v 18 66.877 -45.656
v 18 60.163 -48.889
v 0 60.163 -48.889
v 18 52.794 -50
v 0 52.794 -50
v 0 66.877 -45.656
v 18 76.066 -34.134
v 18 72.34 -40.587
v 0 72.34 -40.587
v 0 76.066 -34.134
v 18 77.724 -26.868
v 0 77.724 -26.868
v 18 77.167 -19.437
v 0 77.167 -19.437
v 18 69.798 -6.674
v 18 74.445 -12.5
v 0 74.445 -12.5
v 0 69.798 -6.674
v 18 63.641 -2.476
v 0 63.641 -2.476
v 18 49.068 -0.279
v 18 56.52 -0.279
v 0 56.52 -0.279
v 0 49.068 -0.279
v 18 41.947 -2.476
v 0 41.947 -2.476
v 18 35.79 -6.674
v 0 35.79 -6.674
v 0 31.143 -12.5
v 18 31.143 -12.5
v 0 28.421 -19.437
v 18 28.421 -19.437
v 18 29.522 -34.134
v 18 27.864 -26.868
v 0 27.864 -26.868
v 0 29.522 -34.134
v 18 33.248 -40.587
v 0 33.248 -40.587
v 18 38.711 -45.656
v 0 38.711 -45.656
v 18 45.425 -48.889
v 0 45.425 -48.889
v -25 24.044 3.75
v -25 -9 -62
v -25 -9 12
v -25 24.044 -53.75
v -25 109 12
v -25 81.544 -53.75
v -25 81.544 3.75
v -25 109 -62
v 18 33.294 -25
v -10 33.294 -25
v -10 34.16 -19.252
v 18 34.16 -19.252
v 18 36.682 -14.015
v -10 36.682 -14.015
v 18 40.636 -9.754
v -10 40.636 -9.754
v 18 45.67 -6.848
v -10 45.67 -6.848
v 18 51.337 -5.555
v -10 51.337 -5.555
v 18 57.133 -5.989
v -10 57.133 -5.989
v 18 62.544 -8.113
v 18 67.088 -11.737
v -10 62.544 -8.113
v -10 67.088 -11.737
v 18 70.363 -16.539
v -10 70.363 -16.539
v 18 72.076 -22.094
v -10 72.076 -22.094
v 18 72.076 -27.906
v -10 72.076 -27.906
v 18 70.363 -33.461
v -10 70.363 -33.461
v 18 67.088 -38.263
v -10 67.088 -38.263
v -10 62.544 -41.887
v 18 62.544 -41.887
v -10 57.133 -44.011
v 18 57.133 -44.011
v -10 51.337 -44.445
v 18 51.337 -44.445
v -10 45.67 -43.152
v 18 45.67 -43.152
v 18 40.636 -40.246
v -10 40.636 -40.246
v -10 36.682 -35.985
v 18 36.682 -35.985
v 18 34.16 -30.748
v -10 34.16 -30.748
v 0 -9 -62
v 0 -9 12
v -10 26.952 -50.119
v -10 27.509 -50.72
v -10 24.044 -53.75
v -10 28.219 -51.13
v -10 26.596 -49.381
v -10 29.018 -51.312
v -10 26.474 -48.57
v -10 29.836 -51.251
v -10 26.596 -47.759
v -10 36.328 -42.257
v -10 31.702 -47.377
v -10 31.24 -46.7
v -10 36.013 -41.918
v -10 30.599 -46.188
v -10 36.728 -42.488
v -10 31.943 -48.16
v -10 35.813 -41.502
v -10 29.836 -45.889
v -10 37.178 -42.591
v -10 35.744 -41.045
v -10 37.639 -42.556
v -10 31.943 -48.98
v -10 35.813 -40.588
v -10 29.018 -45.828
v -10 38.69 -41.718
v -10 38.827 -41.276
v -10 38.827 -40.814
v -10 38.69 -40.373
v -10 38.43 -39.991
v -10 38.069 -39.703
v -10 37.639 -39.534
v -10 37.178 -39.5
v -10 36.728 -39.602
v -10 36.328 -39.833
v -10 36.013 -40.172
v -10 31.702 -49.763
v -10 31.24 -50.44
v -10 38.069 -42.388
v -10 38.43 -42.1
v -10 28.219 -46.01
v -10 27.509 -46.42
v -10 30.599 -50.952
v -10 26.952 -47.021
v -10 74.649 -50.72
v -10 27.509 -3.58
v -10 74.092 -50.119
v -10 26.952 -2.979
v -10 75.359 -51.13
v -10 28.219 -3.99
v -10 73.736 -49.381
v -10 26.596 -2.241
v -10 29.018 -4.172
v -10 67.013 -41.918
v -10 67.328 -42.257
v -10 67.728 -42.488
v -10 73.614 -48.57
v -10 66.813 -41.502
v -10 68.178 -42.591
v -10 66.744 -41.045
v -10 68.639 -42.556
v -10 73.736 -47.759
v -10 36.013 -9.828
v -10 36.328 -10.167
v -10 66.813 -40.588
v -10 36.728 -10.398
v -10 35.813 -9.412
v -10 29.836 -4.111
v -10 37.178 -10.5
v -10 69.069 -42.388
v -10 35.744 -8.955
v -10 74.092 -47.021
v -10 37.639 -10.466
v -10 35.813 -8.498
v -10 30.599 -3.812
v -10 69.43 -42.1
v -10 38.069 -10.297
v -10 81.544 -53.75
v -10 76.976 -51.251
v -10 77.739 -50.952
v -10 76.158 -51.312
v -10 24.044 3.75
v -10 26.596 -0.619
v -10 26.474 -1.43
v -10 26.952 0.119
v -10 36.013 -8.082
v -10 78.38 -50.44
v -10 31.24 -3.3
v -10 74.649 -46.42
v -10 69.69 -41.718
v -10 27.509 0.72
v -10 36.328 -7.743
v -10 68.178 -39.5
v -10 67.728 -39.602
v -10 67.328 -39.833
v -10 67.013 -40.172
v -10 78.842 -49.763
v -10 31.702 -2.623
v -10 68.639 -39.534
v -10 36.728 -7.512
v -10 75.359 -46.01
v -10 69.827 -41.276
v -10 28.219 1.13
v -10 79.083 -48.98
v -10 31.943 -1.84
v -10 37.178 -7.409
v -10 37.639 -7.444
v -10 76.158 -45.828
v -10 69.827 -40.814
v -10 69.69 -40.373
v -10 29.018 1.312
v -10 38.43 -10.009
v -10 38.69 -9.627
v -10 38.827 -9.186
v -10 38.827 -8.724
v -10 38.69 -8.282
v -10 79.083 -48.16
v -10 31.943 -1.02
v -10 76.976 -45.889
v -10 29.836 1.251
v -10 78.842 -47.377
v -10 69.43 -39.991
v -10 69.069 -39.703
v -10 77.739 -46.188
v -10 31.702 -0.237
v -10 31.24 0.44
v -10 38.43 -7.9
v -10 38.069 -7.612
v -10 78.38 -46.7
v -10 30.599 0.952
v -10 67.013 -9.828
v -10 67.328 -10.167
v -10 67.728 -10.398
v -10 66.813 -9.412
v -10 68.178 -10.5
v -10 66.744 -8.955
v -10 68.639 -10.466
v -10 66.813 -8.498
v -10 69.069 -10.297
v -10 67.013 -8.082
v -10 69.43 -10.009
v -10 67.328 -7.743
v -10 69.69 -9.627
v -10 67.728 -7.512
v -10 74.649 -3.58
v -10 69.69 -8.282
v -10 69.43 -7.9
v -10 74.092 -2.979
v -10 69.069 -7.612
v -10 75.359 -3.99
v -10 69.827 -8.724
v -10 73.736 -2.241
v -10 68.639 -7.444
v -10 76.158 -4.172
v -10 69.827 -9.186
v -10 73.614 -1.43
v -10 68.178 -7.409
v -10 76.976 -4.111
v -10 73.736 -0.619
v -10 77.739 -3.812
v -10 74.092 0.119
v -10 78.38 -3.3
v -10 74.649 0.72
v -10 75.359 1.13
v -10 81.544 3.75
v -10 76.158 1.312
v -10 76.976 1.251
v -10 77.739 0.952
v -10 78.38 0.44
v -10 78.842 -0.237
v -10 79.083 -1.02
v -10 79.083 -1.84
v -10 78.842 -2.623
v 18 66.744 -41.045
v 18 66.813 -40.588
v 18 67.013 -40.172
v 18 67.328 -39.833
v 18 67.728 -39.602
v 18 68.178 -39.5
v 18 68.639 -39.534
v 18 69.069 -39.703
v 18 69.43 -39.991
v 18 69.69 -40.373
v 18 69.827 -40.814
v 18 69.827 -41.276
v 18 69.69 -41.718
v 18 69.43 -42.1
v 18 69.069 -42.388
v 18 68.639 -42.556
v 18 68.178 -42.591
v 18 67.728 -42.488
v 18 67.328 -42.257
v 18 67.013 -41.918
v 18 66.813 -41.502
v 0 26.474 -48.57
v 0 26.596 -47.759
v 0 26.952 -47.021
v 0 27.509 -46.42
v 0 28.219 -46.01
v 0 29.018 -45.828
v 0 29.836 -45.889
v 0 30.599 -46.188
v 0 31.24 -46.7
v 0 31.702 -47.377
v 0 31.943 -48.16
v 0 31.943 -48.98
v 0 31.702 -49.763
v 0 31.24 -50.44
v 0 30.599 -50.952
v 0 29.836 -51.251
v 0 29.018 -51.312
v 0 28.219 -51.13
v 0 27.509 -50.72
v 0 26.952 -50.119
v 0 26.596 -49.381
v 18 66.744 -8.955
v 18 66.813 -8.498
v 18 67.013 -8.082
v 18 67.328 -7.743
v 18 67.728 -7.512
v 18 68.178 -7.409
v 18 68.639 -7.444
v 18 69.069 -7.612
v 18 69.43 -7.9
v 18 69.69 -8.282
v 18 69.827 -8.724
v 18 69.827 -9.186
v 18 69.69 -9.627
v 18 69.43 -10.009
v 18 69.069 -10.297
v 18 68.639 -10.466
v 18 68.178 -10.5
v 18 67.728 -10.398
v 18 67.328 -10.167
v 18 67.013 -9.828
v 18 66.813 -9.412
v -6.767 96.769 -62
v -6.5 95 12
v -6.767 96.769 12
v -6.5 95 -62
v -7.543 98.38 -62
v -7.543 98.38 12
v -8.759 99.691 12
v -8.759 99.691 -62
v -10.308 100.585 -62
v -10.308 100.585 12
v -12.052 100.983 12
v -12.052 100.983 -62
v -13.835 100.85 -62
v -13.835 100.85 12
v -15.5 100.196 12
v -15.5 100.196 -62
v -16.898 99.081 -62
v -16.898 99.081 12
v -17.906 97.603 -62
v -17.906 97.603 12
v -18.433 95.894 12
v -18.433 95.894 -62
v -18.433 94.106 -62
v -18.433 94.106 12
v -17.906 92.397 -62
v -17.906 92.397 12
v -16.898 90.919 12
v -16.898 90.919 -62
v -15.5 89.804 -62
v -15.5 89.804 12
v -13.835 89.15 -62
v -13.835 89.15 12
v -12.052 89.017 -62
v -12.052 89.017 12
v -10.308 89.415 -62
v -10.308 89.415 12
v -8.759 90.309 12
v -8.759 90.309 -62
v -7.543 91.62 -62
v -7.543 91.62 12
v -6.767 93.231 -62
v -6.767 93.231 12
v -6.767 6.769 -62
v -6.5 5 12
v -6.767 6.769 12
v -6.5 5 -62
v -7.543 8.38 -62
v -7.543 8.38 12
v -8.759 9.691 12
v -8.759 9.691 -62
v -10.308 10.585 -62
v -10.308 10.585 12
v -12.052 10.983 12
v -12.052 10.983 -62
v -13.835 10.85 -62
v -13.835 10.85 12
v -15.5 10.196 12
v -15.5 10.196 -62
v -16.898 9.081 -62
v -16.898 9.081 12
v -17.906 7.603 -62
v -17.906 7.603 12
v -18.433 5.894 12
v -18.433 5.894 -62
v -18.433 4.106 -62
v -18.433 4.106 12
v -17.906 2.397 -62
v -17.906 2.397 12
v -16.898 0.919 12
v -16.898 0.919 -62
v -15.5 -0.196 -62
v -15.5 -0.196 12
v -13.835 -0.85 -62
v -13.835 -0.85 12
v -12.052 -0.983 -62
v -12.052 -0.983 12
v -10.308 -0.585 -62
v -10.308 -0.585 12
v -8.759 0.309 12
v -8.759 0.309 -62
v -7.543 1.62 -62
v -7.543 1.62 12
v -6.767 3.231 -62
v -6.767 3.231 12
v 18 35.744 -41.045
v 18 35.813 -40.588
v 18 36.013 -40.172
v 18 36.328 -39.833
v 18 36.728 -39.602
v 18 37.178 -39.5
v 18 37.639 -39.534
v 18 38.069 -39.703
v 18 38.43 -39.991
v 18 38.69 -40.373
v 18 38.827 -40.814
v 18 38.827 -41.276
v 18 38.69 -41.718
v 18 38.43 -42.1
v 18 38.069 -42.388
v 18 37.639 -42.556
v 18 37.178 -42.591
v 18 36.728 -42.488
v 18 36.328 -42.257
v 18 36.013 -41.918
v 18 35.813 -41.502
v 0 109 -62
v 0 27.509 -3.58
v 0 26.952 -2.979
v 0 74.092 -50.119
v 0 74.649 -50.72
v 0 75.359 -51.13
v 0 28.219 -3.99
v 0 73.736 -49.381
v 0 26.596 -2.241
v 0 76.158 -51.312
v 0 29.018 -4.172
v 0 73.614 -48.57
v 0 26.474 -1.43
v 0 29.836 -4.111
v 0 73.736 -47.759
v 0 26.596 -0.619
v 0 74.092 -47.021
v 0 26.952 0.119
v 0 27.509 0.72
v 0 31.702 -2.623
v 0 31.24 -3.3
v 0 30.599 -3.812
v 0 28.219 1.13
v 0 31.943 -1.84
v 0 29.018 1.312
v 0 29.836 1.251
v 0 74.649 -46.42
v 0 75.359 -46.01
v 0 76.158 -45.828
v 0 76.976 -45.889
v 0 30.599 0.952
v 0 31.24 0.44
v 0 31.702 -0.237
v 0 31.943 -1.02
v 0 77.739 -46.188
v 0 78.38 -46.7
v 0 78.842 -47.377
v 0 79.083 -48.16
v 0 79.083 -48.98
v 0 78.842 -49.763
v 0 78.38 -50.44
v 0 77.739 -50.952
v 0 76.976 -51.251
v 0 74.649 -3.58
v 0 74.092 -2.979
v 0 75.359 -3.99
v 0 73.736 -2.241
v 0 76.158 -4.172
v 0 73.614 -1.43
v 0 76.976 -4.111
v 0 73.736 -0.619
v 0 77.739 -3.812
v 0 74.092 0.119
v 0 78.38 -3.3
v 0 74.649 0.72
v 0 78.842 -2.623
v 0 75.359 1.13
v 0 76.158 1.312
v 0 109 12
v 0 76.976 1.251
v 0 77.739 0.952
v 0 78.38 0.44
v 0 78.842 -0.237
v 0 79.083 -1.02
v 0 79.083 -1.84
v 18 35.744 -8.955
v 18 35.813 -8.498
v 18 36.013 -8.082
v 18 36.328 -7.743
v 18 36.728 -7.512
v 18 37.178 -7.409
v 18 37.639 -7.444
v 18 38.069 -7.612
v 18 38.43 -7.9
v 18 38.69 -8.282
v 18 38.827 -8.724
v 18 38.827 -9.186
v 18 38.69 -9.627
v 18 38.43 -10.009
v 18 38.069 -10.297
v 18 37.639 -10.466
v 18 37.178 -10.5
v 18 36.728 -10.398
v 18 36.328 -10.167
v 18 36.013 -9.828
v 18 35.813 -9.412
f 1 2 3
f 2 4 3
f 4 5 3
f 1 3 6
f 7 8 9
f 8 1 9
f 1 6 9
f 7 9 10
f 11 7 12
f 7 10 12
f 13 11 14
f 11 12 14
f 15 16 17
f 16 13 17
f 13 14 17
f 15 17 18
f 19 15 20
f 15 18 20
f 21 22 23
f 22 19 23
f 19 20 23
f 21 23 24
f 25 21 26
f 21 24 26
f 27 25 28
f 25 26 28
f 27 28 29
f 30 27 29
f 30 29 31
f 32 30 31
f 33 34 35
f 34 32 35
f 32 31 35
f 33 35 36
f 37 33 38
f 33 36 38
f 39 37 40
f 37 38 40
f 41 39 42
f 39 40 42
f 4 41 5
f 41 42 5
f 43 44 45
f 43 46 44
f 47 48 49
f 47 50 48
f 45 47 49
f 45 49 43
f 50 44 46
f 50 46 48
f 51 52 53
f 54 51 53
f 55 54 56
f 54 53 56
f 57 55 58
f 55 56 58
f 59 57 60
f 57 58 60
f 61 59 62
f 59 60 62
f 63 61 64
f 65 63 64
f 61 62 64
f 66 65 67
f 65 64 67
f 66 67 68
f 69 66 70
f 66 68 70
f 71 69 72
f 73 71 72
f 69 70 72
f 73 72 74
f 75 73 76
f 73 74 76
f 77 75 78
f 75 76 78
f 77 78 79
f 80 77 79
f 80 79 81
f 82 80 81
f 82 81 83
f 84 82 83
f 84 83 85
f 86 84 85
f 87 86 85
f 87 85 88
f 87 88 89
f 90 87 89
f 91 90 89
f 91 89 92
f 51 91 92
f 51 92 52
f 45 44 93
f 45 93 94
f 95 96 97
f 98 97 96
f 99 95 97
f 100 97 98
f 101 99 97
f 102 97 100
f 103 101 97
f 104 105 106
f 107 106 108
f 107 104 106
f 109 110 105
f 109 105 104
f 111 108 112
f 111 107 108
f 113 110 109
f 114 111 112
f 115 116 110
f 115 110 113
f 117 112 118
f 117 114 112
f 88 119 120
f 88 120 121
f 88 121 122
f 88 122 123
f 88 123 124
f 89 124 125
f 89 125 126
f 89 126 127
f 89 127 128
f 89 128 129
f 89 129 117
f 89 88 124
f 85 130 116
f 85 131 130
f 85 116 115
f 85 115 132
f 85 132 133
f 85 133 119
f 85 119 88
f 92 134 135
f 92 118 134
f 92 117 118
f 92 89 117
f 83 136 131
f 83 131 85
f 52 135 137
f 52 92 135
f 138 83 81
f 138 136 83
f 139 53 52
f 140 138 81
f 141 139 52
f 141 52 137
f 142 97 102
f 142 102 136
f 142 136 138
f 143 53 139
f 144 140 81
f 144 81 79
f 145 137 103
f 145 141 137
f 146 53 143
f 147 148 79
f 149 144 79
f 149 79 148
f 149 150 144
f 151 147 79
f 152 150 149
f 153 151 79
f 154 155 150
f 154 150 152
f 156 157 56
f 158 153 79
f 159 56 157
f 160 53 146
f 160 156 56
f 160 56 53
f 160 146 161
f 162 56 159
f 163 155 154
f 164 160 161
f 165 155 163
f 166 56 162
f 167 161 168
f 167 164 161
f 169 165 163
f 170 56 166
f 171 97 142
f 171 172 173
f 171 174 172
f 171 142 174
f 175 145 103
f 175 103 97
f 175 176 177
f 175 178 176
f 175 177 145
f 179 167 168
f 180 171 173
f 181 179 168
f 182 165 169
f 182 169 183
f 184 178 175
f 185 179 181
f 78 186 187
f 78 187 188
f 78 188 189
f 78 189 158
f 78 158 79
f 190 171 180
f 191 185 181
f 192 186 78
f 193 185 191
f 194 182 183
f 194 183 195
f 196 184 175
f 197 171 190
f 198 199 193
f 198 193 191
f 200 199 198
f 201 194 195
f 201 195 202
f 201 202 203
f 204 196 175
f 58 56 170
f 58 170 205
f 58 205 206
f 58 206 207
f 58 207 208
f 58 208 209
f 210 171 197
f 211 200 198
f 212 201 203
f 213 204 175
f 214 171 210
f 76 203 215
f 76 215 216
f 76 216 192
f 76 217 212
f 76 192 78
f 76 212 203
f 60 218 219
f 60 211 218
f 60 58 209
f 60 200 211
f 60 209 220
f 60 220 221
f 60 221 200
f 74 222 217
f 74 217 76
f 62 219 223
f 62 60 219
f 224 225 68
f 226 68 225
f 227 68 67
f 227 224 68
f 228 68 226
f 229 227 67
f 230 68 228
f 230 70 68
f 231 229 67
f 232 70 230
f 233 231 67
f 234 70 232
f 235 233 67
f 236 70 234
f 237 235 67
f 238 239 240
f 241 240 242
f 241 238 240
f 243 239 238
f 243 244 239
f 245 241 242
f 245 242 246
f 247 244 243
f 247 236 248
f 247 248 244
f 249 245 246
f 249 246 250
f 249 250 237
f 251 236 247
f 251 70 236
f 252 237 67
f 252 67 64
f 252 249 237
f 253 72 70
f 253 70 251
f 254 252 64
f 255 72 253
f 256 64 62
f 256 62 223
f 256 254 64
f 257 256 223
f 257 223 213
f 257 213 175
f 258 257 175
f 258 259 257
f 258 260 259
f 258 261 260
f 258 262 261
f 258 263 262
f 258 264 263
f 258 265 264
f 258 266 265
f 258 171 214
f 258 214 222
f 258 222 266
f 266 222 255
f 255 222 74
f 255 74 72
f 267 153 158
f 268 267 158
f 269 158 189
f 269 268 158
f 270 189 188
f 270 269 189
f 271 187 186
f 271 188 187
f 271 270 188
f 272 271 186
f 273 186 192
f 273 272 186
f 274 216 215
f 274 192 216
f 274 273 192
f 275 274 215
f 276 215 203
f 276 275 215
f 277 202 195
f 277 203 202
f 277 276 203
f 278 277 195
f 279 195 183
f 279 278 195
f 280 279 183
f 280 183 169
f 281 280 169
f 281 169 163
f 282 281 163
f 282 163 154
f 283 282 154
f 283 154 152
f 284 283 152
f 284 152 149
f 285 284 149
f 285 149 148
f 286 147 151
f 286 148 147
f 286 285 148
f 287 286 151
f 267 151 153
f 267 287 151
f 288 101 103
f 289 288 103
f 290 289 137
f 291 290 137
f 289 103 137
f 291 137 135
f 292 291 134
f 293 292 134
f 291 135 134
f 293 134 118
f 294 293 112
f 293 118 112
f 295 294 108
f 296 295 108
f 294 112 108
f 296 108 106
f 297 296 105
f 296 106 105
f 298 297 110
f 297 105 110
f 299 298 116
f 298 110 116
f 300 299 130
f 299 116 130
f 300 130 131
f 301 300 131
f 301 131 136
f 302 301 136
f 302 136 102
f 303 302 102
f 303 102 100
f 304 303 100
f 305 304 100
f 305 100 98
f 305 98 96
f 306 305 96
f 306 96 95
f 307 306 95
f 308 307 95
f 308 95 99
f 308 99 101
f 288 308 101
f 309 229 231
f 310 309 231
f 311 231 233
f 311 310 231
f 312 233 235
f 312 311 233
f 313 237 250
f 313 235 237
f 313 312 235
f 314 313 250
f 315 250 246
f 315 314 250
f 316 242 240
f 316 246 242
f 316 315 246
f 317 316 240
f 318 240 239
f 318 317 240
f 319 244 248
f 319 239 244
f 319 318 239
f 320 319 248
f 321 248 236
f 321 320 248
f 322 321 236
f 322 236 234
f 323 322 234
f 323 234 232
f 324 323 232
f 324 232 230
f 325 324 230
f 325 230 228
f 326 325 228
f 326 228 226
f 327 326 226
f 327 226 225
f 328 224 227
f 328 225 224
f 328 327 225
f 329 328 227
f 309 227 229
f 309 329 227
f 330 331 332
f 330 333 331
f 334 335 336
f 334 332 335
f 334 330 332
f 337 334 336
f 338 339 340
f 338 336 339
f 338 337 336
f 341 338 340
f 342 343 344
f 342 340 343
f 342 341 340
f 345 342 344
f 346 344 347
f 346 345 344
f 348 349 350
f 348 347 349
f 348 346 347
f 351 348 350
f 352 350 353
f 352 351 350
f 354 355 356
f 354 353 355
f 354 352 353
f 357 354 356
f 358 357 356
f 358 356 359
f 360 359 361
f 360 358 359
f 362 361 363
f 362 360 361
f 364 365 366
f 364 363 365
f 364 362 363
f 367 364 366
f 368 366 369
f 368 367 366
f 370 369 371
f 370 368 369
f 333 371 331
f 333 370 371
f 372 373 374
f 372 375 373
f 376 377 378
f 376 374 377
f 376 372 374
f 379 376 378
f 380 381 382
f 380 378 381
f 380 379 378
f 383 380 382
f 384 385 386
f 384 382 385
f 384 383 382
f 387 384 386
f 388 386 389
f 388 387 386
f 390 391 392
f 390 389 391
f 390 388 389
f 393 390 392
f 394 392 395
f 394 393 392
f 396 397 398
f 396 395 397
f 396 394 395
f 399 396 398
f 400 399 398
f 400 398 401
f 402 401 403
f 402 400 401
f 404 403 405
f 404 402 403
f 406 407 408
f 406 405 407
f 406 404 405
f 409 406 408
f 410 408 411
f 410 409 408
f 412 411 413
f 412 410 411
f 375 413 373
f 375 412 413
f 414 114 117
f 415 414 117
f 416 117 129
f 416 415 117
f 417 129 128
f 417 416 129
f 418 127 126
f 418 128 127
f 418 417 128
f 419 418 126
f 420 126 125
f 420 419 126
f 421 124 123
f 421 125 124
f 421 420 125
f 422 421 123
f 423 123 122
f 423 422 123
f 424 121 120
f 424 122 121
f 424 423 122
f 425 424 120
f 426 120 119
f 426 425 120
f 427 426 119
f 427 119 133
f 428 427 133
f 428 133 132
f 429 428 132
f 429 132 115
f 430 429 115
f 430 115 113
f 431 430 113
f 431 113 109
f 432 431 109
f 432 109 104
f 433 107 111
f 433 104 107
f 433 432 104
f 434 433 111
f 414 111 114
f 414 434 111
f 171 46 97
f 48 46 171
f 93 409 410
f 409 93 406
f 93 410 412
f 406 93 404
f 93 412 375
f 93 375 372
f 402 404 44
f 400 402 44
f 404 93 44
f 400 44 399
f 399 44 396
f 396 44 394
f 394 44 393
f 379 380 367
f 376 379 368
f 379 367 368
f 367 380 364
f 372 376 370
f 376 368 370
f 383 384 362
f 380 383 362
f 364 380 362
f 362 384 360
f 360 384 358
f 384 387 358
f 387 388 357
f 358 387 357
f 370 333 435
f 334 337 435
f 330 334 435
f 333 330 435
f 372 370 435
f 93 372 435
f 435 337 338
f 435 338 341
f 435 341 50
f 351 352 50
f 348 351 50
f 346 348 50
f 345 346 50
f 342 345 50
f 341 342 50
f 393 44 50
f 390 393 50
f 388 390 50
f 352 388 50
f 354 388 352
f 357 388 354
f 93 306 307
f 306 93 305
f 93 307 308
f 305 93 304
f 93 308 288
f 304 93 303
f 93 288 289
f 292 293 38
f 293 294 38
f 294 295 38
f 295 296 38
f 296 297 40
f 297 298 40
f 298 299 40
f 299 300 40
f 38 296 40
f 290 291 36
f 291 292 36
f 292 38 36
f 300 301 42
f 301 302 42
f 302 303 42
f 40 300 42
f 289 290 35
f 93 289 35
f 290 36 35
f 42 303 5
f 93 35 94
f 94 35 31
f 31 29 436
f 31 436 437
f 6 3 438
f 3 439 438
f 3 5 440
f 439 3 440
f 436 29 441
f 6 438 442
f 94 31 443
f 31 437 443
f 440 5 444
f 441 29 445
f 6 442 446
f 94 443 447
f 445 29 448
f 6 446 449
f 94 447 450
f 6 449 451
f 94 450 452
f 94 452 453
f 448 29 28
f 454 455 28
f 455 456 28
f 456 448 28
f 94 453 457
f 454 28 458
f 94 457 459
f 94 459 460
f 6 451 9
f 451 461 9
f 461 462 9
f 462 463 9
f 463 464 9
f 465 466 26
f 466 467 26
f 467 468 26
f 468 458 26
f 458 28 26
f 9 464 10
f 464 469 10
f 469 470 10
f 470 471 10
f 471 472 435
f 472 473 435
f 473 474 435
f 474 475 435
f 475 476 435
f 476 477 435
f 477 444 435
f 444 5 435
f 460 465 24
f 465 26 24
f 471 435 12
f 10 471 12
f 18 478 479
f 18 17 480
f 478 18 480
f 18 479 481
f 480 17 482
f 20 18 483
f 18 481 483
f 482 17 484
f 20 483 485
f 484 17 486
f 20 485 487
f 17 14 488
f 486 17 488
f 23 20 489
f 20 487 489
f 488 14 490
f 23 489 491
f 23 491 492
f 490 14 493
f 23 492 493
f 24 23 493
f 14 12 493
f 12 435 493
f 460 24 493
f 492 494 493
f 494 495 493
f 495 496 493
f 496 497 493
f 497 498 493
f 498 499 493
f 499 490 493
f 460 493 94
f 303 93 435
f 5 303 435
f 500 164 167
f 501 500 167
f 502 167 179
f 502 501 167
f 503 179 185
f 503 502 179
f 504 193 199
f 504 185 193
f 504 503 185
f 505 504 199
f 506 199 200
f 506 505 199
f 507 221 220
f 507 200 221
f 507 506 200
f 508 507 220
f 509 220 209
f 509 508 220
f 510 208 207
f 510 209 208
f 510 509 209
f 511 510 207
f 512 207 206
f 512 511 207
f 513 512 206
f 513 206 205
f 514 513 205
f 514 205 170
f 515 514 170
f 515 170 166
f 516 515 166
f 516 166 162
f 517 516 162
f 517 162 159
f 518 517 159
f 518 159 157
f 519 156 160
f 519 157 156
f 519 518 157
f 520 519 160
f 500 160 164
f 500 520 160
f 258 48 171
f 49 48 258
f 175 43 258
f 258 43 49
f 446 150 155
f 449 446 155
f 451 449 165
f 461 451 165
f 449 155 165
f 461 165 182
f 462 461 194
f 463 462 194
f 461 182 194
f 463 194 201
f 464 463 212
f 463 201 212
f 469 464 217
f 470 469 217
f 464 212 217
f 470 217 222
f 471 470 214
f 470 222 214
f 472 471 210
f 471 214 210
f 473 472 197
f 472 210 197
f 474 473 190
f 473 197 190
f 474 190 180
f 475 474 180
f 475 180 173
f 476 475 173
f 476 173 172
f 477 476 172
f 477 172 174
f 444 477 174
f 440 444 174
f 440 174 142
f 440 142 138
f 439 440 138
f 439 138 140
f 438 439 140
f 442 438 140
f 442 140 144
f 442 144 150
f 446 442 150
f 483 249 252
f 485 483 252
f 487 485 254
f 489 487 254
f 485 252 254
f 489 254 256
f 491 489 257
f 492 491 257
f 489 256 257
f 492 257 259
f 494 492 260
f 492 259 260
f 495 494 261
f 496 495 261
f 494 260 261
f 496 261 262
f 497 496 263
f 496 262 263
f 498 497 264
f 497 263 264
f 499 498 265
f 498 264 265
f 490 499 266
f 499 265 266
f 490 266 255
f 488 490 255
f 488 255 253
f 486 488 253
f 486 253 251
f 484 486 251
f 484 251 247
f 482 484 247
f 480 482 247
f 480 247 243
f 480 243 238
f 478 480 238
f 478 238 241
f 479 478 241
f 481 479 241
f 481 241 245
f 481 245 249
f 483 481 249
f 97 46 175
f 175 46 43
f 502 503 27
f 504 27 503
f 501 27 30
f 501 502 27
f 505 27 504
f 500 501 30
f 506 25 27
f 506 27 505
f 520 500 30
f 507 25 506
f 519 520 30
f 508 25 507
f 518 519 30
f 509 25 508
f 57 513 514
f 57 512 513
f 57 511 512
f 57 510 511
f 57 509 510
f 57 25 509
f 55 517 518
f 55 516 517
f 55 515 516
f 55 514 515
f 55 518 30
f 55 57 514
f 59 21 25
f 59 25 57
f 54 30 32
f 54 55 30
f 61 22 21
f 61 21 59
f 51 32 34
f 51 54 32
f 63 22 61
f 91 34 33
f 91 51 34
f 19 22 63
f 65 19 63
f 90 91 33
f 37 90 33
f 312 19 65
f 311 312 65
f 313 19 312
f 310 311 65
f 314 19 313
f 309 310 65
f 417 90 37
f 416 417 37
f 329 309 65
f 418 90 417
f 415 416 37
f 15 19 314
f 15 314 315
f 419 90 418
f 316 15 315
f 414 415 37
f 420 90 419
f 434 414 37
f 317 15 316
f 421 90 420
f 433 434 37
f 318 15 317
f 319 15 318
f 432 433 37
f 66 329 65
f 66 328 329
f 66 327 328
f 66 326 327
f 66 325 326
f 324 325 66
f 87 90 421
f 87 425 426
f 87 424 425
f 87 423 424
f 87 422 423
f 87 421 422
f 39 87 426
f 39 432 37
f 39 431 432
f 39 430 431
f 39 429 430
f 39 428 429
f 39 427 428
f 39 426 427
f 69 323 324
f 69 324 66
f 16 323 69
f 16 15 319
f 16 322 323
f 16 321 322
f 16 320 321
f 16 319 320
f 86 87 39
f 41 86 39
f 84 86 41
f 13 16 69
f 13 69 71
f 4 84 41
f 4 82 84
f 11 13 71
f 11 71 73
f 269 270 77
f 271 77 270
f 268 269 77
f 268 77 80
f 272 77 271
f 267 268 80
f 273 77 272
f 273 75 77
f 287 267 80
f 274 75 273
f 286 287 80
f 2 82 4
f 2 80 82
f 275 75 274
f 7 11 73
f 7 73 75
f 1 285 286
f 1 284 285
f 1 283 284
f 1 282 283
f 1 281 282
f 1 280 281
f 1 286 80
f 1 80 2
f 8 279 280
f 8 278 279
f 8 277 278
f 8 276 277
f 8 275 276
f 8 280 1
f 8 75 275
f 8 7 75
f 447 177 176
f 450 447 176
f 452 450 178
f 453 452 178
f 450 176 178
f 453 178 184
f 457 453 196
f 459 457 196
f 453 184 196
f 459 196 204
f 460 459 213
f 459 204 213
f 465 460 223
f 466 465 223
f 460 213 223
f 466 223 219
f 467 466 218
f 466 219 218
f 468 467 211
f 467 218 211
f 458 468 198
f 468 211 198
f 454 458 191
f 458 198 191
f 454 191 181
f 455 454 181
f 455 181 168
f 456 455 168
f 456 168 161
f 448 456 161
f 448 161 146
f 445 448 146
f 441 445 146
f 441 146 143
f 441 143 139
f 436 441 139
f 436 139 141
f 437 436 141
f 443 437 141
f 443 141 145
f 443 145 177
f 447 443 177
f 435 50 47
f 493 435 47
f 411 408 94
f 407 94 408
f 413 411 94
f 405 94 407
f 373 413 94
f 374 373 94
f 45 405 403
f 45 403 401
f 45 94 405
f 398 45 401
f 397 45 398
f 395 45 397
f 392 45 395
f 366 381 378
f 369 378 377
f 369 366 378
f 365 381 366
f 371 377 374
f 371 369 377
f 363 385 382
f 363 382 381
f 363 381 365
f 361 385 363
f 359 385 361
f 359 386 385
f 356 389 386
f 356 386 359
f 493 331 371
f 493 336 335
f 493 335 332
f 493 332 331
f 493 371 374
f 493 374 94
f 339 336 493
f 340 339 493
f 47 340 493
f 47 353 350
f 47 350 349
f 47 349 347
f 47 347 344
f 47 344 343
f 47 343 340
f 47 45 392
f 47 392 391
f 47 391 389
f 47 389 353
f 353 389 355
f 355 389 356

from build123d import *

# Parameters (mm, degrees)
BOSS_EXTRUDE1_DEPTH      = 320
SKETCH2_W                = 25
SKETCH2_H                = 100
BOSS_EXTRUDE2_DEPTH      = 50
CUT_EXTRUDE1_DEPTH       = 337.19190948
CUT_EXTRUDE1_DEPTH_BACK  = 337.19190948
SKETCH3_R                = 5
SKETCH4_W                = 150
SKETCH4_H                = 19.211352241
BOSS_EXTRUDE3_DEPTH      = 100
BOSS_EXTRUDE4_DEPTH      = 100
SKETCH6_W                = 42.1
SKETCH6_H                = 42.1
CUT_EXTRUDE2_DEPTH       = 10
SKETCH7_R                = 11
CUT_EXTRUDE3_DEPTH       = 2
CUT_EXTRUDE4_DEPTH       = 391.24267
CUT_EXTRUDE4_DEPTH_BACK  = 391.24267
SKETCH8_R                = 11
SKETCH10_R               = 25
SKETCH10_R_2             = 11
BOSS_EXTRUDE5_DEPTH      = 18
CUT_EXTRUDE6_DEPTH       = 381.347658714
CUT_EXTRUDE6_DEPTH_BACK  = 381.347658714
BOSS_EXTRUDE6_REACH      = 243.332
SKETCH12_W               = 150
SKETCH12_H               = 15
SKETCH13_W               = 165
SKETCH13_H               = 5
BOSS_EXTRUDE7_DEPTH      = 100
CUT_EXTRUDE7_DEPTH       = 282.821411126
CUT_EXTRUDE7_DEPTH_BACK  = 282.821411126
SKETCH16_W               = 62.5
SKETCH16_H               = 22.206056974
CUT_EXTRUDE9_DEPTH       = 298.574684732
SKETCH17_W               = 62.5
SKETCH17_H               = 5
BOSS_EXTRUDE8_DEPTH      = 15
SKETCH18_W               = 62.5
SKETCH18_H               = 11.362446971
BOSS_EXTRUDE9_DEPTH      = 15
SKETCH19_W               = 25
SKETCH19_H               = 100
BOSS_EXTRUDE11_DEPTH     = 9
SKETCH20_R               = 5
CUT_EXTRUDE10_DEPTH      = 62.5
SKETCH21_R               = 6
CUT_EXTRUDE11_DEPTH      = 62.5
CUT_EXTRUDE12_DEPTH      = 7
CUT_EXTRUDE14_DEPTH      = 261.438787644
CUT_EXTRUDE14_DEPTH_BACK = 261.438787644
SKETCH23_OUTSIDE_W       = 346.597
SKETCH23_OUTSIDE_H       = 164.386
SKETCH23_OUTSIDE_W_2     = 50
SKETCH23_OUTSIDE_H_2     = 100
CUT_EXTRUDE15_DEPTH      = 115.564392374
CUT_EXTRUDE15_DEPTH_BACK = 115.564392374
SKETCH24_R               = 6
SKETCH25_W               = 25
SKETCH25_H               = 5
BOSS_EXTRUDE12_DEPTH     = 50
SKETCH26_W               = 25
SKETCH26_H               = 4
BOSS_EXTRUDE13_DEPTH     = 50
CUT_EXTRUDE17_DEPTH      = 125.378454726
CUT_EXTRUDE17_DEPTH_BACK = 125.378454726
SKETCH27_R               = 1.55
SKETCH28_R               = 6
BOSS_EXTRUDE14_DEPTH     = 50
SKETCH29_R               = 5
CUT_EXTRUDE18_DEPTH      = 123.498979588
SKETCH30_R               = 5
BOSS_EXTRUDE15_DEPTH     = 50
SKETCH31_R               = 6
CUT_EXTRUDE19_DEPTH      = 123.498979588
SKETCH32_W               = 12
SKETCH32_H               = 118
BOSS_EXTRUDE17_DEPTH     = 25
SKETCH35_W               = 57
SKETCH35_H               = 57
CUT_EXTRUDE20_DEPTH      = 10
SKETCH36_R               = 19.5
CUT_EXTRUDE21_DEPTH      = 130.668808894
SKETCH37_R               = 2.75
CUT_EXTRUDE23_DEPTH      = 130.668808894
CUT_EXTRUDE24_DEPTH      = 135.096979832
CUT_EXTRUDE24_DEPTH_BACK = 135.096979832
SKETCH38_R               = 6
SKETCH39_W               = 57.5
SKETCH39_H               = 57.5
CUT_EXTRUDE25_DEPTH      = 10
SKETCH41_W               = 57.5
SKETCH41_H               = 57.5
CUT_EXTRUDE26_DEPTH      = 5


with BuildPart() as part:
    # Sketch1 → Boss-Extrude1 (new body)
    with BuildSketch(Plane.XY):
        Polygon((0, 100), (0, 85.5), (-5.5, 85.5), (-5.5, 92.241974104), (-11, 92.241974104), (-11, 13.345911947), (-5.5, 13.345911947), (-5.5, 20.087886052), (0, 20.087886052), (0, 5.587886052), (0, 0), (-25, 0), (-25, 100), align=None)
    extrude(amount=BOSS_EXTRUDE1_DEPTH)

    # Sketch2 → Boss-Extrude2 (add)
    with BuildSketch(Plane(origin=(0, 0, 0), x_dir=(-1, 0, 0), z_dir=(0, 0, -1))):
        with Locations((12.5, 50)):
            Rectangle(SKETCH2_W, SKETCH2_H)
    extrude(amount=BOSS_EXTRUDE2_DEPTH)

    # Sketch3 → Cut-Extrude1 (cut, two sides: drawn at the far end of the back side and taken through both)
    with BuildSketch(Plane(origin=(0, 0, 0), x_dir=(0, 0, -1), z_dir=(1, 0, 0)).offset(-CUT_EXTRUDE1_DEPTH_BACK)):
        with Locations(Location((25, 52.793943026, 0), (0, 0, 90))):
            Circle(SKETCH3_R)
    extrude(amount=CUT_EXTRUDE1_DEPTH + CUT_EXTRUDE1_DEPTH_BACK, mode=Mode.SUBTRACT)

    # Sketch4 → Boss-Extrude3 (add)
    with BuildSketch(Plane(origin=(0, 100, 0), x_dir=(1, 0, 0), z_dir=(0, 1, 0))):
        with Locations((50, -329.60567612)):
            Rectangle(SKETCH4_W, SKETCH4_H)
    extrude(amount=-BOSS_EXTRUDE3_DEPTH)

    # Sketch5 → Boss-Extrude4 (add)
    with BuildSketch(Plane(origin=(0, 0, 0), x_dir=(1, 0, 0), z_dir=(0, 1, 0))):
        Polygon((125, -209.211352241), (125, -339.211352241), (127.245354701, -339.211352241), (140, -339.211352241), (140, -209.211352241), align=None)
    extrude(amount=BOSS_EXTRUDE4_DEPTH)

    # Sketch6 → Cut-Extrude2 (cut)
    with BuildSketch(Plane.ZY.offset(25)):
        with Locations((-25, 52.793943026)):
            Rectangle(SKETCH6_W, SKETCH6_H)
    extrude(amount=-CUT_EXTRUDE2_DEPTH, mode=Mode.SUBTRACT)

    # Sketch7 → Cut-Extrude3 (cut)
    with BuildSketch(Plane.ZY.offset(15)):
        with Locations(Location((-25, 52.793943026, 0), (0, 0, 270))):
            Circle(SKETCH7_R)
    extrude(amount=-CUT_EXTRUDE3_DEPTH, mode=Mode.SUBTRACT)

    # Sketch8 → Cut-Extrude4 (cut, two sides: drawn at the far end of the back side and taken through both)
    with BuildSketch(Plane.ZY.offset(25).offset(-CUT_EXTRUDE4_DEPTH_BACK)):
        with Locations(Location((-25, 52.793943026, 0), (0, 0, 270))):
            Circle(SKETCH8_R)
    extrude(amount=CUT_EXTRUDE4_DEPTH + CUT_EXTRUDE4_DEPTH_BACK, mode=Mode.SUBTRACT)

    # Sketch10 → Boss-Extrude5 (add)
    with BuildSketch(Plane(origin=(0, 0, 0), x_dir=(0, 0, -1), z_dir=(1, 0, 0))):
        with Locations((25, 52.793943026)):
            Circle(SKETCH10_R)
        with Locations(Location((25, 52.793943026, 0), (0, 0, 270))):
            Circle(SKETCH10_R_2, mode=Mode.SUBTRACT)
    extrude(amount=BOSS_EXTRUDE5_DEPTH)

    # Sketch11 → Cut-Extrude6 (cut, two sides: drawn at the far end of the back side and taken through both)
    with BuildSketch(Plane(origin=(0, 0, 0), x_dir=(1, 0, 0), z_dir=(0, 1, 0)).offset(-CUT_EXTRUDE6_DEPTH_BACK)):
        Polygon((-25, -339.211352241), (-25, -218.211352241), (83.728432641, -218.211352241), (83.728432641, -190.050980202), (162.673418017, -190.050980202), (162.673418017, -339.211352241), align=None)
    extrude(amount=CUT_EXTRUDE6_DEPTH + CUT_EXTRUDE6_DEPTH_BACK, mode=Mode.SUBTRACT)

    # Boss-Extrude6: up to this face of the body (flat: up to its plane)
    boss_extrude6_end = Plane(part.part.faces().sort_by_distance((-12.5, 100, 84.10567612))[0])
    # Sketch12 → Boss-Extrude6 (add, up to the picked face)
    with BuildSketch(Plane(origin=(0, 0, 0), x_dir=(1, 0, 0), z_dir=(0, 1, 0)), mode=Mode.PRIVATE) as boss_extrude6_sk1:
        with Locations((50, -210.711352241)):
            Rectangle(SKETCH12_W, SKETCH12_H)
    boss_extrude6_tool1 = split(extrude(boss_extrude6_sk1.sketch, amount=BOSS_EXTRUDE6_REACH, mode=Mode.PRIVATE), bisect_by=boss_extrude6_end, keep=Keep.BOTH, mode=Mode.PRIVATE)
    # Sketch12 → Boss-Extrude6 (add, up to the picked face)
    with BuildSketch(Plane(origin=(0, 0, 0), x_dir=(1, 0, 0), z_dir=(0, 1, 0)), mode=Mode.PRIVATE) as boss_extrude6_sk2:
        Polygon((140, -118.211352241), (125, -118.211352241), (125, -203.211352241), (125, -218.211352241), (140, -218.211352241), align=None)
    boss_extrude6_tool2 = split(extrude(boss_extrude6_sk2.sketch, amount=BOSS_EXTRUDE6_REACH, mode=Mode.PRIVATE), bisect_by=boss_extrude6_end, keep=Keep.BOTH, mode=Mode.PRIVATE)
    add(boss_extrude6_tool1.solids().sort_by(Axis((50, 0, 210.711352), (0, 1, 0)))[0])
    add(boss_extrude6_tool2.solids().sort_by(Axis((132.5, 0, 168.211352), (0, 1, 0)))[0])

    # Sketch13 → Boss-Extrude7 (add)
    with BuildSketch(Plane(origin=(0, 0, 0), x_dir=(1, 0, 0), z_dir=(0, 1, 0))):
        with Locations((57.5, -220.711352241)):
            Rectangle(SKETCH13_W, SKETCH13_H)
    extrude(amount=BOSS_EXTRUDE7_DEPTH)

    # Sketch14 → Cut-Extrude7 (cut, two sides: drawn at the far end of the back side and taken through both)
    with BuildSketch(Plane(origin=(0, 0, 0), x_dir=(1, 0, 0), z_dir=(0, 1, 0)).offset(-CUT_EXTRUDE7_DEPTH_BACK)):
        Polygon((62.5, -203.211352241), (62.5, -244.24795379), (164.214361429, -244.24795379), (164.214361429, -100.335073146), (62.5, -100.335073146), align=None)
    extrude(amount=CUT_EXTRUDE7_DEPTH + CUT_EXTRUDE7_DEPTH_BACK, mode=Mode.SUBTRACT)

    # Sketch16 → Cut-Extrude9 (cut, through all)
    with BuildSketch(Plane.XY.offset(223.211352241)):
        with Locations((31.25, 88.896971513)):
            Rectangle(SKETCH16_W, SKETCH16_H)
        with Locations((31.25, 11.103028487)):
            Rectangle(SKETCH16_W, SKETCH16_H)
    extrude(amount=-CUT_EXTRUDE9_DEPTH, mode=Mode.SUBTRACT)

    # Sketch17 → Boss-Extrude8 (add)
    with BuildSketch(Plane(origin=(0, 77.793943026, 0), x_dir=(1, 0, 0), z_dir=(0, 1, 0))):
        with Locations((31.25, -210.711352241)):
            Rectangle(SKETCH17_W, SKETCH17_H)
        with Locations((31.25, -215.711352241)):
            Rectangle(SKETCH17_W, SKETCH17_H)
    extrude(amount=BOSS_EXTRUDE8_DEPTH)

    # Sketch18 → Boss-Extrude9 (add)
    with BuildSketch(Plane.XZ.offset(-22.206056974)):
        with Locations((31.25, 213.211352241)):
            Rectangle(SKETCH18_W, SKETCH18_H)
    extrude(amount=BOSS_EXTRUDE9_DEPTH)

    # Sketch19 → Boss-Extrude11 (add)
    with BuildSketch(Plane.XY.offset(223.211352241)):
        with Locations((-12.5, 50)):
            Rectangle(SKETCH19_W, SKETCH19_H)
    extrude(amount=BOSS_EXTRUDE11_DEPTH)

    # Sketch20 → Cut-Extrude10 (cut)
    with BuildSketch(Plane(origin=(62.5, 0, 0), x_dir=(0, 0, -1), z_dir=(1, 0, 0))):
        with Locations((-213.211352241, 50)):
            Circle(SKETCH20_R)
    extrude(amount=-CUT_EXTRUDE10_DEPTH, mode=Mode.SUBTRACT)

    # Sketch21 → Cut-Extrude11 (cut)
    with BuildSketch(Plane(origin=(62.5, 0, 0), x_dir=(0, 0, -1), z_dir=(1, 0, 0))):
        with Locations((-213.211352241, 50)):
            Circle(SKETCH21_R)
    extrude(amount=-CUT_EXTRUDE11_DEPTH, mode=Mode.SUBTRACT)

    # Sketch22 → Cut-Extrude12 (cut)
    with BuildSketch(Plane(origin=(62.5, 0, 0), x_dir=(0, 0, -1), z_dir=(1, 0, 0))):
        Polygon((-204.611352241, 45.034787685), (-204.611352241, 54.965212315), (-213.211352241, 59.93042463), (-221.811352241, 54.965212315), (-221.811352241, 45.034787685), (-213.211352241, 40.06957537), align=None)
    extrude(amount=-CUT_EXTRUDE12_DEPTH, mode=Mode.SUBTRACT)

    # Sketch23 outside → Cut-Extrude14 (cut, two sides: drawn at the far end of the back side and taken through both)
    with BuildSketch(Plane(origin=(0, 0, 0), x_dir=(0, 0, -1), z_dir=(1, 0, 0)).offset(-CUT_EXTRUDE14_DEPTH_BACK)):
        with Locations((-91.1055, 50)):
            Rectangle(SKETCH23_OUTSIDE_W, SKETCH23_OUTSIDE_H)
        with Locations((25, 50)):
            Rectangle(SKETCH23_OUTSIDE_W_2, SKETCH23_OUTSIDE_H_2, mode=Mode.SUBTRACT)
    extrude(amount=CUT_EXTRUDE14_DEPTH + CUT_EXTRUDE14_DEPTH_BACK, mode=Mode.SUBTRACT)

    # Sketch24 → Cut-Extrude15 (cut, two sides: drawn at the far end of the back side and taken through both)
    with BuildSketch(Plane.XY.offset(-CUT_EXTRUDE15_DEPTH_BACK)):
        with Locations((-12.5, 90)):
            Circle(SKETCH24_R)
        with Locations(Location((-12.5, 10, 0), (0, 0, 180))):
            Circle(SKETCH24_R)
    extrude(amount=CUT_EXTRUDE15_DEPTH + CUT_EXTRUDE15_DEPTH_BACK, mode=Mode.SUBTRACT)

    # Sketch25 → Boss-Extrude12 (add)
    with BuildSketch(Plane.XY):
        with Locations((-12.5, 102.5)):
            Rectangle(SKETCH25_W, SKETCH25_H)
        with Locations((-12.5, -2.5)):
            Rectangle(SKETCH25_W, SKETCH25_H)
    extrude(amount=-BOSS_EXTRUDE12_DEPTH)

    # Sketch26 → Boss-Extrude13 (add)
    with BuildSketch(Plane.XY):
        with Locations((-12.5, -7)):
            Rectangle(SKETCH26_W, SKETCH26_H)
        with Locations((-12.5, 107)):
            Rectangle(SKETCH26_W, SKETCH26_H)
    extrude(amount=-BOSS_EXTRUDE13_DEPTH)

    # Sketch27 → Cut-Extrude17 (cut, two sides: drawn at the far end of the back side and taken through both)
    with BuildSketch(Plane.ZY.offset(15).offset(-CUT_EXTRUDE17_DEPTH_BACK)):
        with Locations(Location((-8.954662436, 68.293943026, 0), (0, 0, 270))):
            Circle(SKETCH27_R)
        with Locations(Location((-41.045337564, 68.293943026, 0), (0, 0, 270))):
            Circle(SKETCH27_R)
        with Locations(Location((-41.045337564, 37.293943026, 0), (0, 0, 270))):
            Circle(SKETCH27_R)
        with Locations(Location((-8.954662436, 37.293943026, 0), (0, 0, 270))):
            Circle(SKETCH27_R)
    extrude(amount=CUT_EXTRUDE17_DEPTH + CUT_EXTRUDE17_DEPTH_BACK, mode=Mode.SUBTRACT)

    # Sketch28 → Boss-Extrude14 (add)
    with BuildSketch(Plane.XY):
        with Locations((-12.5, 90)):
            Circle(SKETCH28_R)
        with Locations((-12.5, 10)):
            Circle(SKETCH28_R)
    extrude(amount=-BOSS_EXTRUDE14_DEPTH)

    # Sketch29 → Cut-Extrude18 (cut, through all)
    with BuildSketch(Plane.XY):
        with Locations((-12.5, 99)):
            Circle(SKETCH29_R)
        with Locations(Location((-12.5, 1, 0), (0, 0, 180))):
            Circle(SKETCH29_R)
    extrude(amount=-CUT_EXTRUDE18_DEPTH, mode=Mode.SUBTRACT)

    # Sketch30 → Boss-Extrude15 (add)
    with BuildSketch(Plane.XY):
        with Locations((-12.5, 99)):
            Circle(SKETCH30_R)
        with Locations((-12.5, 1)):
            Circle(SKETCH30_R)
    extrude(amount=-BOSS_EXTRUDE15_DEPTH)

    # Sketch31 → Cut-Extrude19 (cut, through all)
    with BuildSketch(Plane.XY):
        with Locations((-12.5, 95)):
            Circle(SKETCH31_R)
        with Locations((-12.5, 5)):
            Circle(SKETCH31_R)
    extrude(amount=-CUT_EXTRUDE19_DEPTH, mode=Mode.SUBTRACT)

    # Sketch32 → Boss-Extrude17 (add)
    with BuildSketch(Plane.ZY.offset(25)):
        with Locations((6, 50)):
            Rectangle(SKETCH32_W, SKETCH32_H)
        with Locations((-56, 50)):
            Rectangle(SKETCH32_W, SKETCH32_H)
    extrude(amount=-BOSS_EXTRUDE17_DEPTH)

    # Sketch35 → Cut-Extrude20 (cut)
    with BuildSketch(Plane.ZY.offset(25)):
        with Locations((-25, 52.793943026)):
            Rectangle(SKETCH35_W, SKETCH35_H)
    extrude(amount=-CUT_EXTRUDE20_DEPTH, mode=Mode.SUBTRACT)

    # Sketch36 → Cut-Extrude21 (cut, through all)
    with BuildSketch(Plane.ZY.offset(15)):
        with Locations(Location((-25, 52.793943026, 0), (0, 0, 270))):
            Circle(SKETCH36_R)
    extrude(amount=-CUT_EXTRUDE21_DEPTH, mode=Mode.SUBTRACT)

    # Sketch37 → Cut-Extrude23 (cut, through all)
    with BuildSketch(Plane.ZY.offset(15)):
        with Locations(Location((-48.57, 76.363943026, 0), (0, 0, 270))):
            Circle(SKETCH37_R)
        with Locations(Location((-1.43, 76.363943026, 0), (0, 0, 270))):
            Circle(SKETCH37_R)
        with Locations(Location((-1.43, 29.223943026, 0), (0, 0, 270))):
            Circle(SKETCH37_R)
        with Locations(Location((-48.57, 29.223943026, 0), (0, 0, 270))):
            Circle(SKETCH37_R)
    extrude(amount=-CUT_EXTRUDE23_DEPTH, mode=Mode.SUBTRACT)

    # Sketch38 → Cut-Extrude24 (cut, two sides: drawn at the far end of the back side and taken through both)
    with BuildSketch(Plane.XY.offset(12).offset(-CUT_EXTRUDE24_DEPTH_BACK)):
        with Locations((-12.5, 95)):
            Circle(SKETCH38_R)
        with Locations((-12.5, 5)):
            Circle(SKETCH38_R)
    extrude(amount=CUT_EXTRUDE24_DEPTH + CUT_EXTRUDE24_DEPTH_BACK, mode=Mode.SUBTRACT)

    # Sketch39 → Cut-Extrude25 (cut)
    with BuildSketch(Plane.ZY.offset(25)):
        with Locations((-25, 52.793943026)):
            Rectangle(SKETCH39_W, SKETCH39_H)
    extrude(amount=-CUT_EXTRUDE25_DEPTH, mode=Mode.SUBTRACT)

    # Sketch41 → Cut-Extrude26 (cut)
    with BuildSketch(Plane.ZY.offset(15)):
        with Locations((-25, 52.793943026)):
            Rectangle(SKETCH41_W, SKETCH41_H)
    extrude(amount=-CUT_EXTRUDE26_DEPTH, mode=Mode.SUBTRACT)


solid = part.part
